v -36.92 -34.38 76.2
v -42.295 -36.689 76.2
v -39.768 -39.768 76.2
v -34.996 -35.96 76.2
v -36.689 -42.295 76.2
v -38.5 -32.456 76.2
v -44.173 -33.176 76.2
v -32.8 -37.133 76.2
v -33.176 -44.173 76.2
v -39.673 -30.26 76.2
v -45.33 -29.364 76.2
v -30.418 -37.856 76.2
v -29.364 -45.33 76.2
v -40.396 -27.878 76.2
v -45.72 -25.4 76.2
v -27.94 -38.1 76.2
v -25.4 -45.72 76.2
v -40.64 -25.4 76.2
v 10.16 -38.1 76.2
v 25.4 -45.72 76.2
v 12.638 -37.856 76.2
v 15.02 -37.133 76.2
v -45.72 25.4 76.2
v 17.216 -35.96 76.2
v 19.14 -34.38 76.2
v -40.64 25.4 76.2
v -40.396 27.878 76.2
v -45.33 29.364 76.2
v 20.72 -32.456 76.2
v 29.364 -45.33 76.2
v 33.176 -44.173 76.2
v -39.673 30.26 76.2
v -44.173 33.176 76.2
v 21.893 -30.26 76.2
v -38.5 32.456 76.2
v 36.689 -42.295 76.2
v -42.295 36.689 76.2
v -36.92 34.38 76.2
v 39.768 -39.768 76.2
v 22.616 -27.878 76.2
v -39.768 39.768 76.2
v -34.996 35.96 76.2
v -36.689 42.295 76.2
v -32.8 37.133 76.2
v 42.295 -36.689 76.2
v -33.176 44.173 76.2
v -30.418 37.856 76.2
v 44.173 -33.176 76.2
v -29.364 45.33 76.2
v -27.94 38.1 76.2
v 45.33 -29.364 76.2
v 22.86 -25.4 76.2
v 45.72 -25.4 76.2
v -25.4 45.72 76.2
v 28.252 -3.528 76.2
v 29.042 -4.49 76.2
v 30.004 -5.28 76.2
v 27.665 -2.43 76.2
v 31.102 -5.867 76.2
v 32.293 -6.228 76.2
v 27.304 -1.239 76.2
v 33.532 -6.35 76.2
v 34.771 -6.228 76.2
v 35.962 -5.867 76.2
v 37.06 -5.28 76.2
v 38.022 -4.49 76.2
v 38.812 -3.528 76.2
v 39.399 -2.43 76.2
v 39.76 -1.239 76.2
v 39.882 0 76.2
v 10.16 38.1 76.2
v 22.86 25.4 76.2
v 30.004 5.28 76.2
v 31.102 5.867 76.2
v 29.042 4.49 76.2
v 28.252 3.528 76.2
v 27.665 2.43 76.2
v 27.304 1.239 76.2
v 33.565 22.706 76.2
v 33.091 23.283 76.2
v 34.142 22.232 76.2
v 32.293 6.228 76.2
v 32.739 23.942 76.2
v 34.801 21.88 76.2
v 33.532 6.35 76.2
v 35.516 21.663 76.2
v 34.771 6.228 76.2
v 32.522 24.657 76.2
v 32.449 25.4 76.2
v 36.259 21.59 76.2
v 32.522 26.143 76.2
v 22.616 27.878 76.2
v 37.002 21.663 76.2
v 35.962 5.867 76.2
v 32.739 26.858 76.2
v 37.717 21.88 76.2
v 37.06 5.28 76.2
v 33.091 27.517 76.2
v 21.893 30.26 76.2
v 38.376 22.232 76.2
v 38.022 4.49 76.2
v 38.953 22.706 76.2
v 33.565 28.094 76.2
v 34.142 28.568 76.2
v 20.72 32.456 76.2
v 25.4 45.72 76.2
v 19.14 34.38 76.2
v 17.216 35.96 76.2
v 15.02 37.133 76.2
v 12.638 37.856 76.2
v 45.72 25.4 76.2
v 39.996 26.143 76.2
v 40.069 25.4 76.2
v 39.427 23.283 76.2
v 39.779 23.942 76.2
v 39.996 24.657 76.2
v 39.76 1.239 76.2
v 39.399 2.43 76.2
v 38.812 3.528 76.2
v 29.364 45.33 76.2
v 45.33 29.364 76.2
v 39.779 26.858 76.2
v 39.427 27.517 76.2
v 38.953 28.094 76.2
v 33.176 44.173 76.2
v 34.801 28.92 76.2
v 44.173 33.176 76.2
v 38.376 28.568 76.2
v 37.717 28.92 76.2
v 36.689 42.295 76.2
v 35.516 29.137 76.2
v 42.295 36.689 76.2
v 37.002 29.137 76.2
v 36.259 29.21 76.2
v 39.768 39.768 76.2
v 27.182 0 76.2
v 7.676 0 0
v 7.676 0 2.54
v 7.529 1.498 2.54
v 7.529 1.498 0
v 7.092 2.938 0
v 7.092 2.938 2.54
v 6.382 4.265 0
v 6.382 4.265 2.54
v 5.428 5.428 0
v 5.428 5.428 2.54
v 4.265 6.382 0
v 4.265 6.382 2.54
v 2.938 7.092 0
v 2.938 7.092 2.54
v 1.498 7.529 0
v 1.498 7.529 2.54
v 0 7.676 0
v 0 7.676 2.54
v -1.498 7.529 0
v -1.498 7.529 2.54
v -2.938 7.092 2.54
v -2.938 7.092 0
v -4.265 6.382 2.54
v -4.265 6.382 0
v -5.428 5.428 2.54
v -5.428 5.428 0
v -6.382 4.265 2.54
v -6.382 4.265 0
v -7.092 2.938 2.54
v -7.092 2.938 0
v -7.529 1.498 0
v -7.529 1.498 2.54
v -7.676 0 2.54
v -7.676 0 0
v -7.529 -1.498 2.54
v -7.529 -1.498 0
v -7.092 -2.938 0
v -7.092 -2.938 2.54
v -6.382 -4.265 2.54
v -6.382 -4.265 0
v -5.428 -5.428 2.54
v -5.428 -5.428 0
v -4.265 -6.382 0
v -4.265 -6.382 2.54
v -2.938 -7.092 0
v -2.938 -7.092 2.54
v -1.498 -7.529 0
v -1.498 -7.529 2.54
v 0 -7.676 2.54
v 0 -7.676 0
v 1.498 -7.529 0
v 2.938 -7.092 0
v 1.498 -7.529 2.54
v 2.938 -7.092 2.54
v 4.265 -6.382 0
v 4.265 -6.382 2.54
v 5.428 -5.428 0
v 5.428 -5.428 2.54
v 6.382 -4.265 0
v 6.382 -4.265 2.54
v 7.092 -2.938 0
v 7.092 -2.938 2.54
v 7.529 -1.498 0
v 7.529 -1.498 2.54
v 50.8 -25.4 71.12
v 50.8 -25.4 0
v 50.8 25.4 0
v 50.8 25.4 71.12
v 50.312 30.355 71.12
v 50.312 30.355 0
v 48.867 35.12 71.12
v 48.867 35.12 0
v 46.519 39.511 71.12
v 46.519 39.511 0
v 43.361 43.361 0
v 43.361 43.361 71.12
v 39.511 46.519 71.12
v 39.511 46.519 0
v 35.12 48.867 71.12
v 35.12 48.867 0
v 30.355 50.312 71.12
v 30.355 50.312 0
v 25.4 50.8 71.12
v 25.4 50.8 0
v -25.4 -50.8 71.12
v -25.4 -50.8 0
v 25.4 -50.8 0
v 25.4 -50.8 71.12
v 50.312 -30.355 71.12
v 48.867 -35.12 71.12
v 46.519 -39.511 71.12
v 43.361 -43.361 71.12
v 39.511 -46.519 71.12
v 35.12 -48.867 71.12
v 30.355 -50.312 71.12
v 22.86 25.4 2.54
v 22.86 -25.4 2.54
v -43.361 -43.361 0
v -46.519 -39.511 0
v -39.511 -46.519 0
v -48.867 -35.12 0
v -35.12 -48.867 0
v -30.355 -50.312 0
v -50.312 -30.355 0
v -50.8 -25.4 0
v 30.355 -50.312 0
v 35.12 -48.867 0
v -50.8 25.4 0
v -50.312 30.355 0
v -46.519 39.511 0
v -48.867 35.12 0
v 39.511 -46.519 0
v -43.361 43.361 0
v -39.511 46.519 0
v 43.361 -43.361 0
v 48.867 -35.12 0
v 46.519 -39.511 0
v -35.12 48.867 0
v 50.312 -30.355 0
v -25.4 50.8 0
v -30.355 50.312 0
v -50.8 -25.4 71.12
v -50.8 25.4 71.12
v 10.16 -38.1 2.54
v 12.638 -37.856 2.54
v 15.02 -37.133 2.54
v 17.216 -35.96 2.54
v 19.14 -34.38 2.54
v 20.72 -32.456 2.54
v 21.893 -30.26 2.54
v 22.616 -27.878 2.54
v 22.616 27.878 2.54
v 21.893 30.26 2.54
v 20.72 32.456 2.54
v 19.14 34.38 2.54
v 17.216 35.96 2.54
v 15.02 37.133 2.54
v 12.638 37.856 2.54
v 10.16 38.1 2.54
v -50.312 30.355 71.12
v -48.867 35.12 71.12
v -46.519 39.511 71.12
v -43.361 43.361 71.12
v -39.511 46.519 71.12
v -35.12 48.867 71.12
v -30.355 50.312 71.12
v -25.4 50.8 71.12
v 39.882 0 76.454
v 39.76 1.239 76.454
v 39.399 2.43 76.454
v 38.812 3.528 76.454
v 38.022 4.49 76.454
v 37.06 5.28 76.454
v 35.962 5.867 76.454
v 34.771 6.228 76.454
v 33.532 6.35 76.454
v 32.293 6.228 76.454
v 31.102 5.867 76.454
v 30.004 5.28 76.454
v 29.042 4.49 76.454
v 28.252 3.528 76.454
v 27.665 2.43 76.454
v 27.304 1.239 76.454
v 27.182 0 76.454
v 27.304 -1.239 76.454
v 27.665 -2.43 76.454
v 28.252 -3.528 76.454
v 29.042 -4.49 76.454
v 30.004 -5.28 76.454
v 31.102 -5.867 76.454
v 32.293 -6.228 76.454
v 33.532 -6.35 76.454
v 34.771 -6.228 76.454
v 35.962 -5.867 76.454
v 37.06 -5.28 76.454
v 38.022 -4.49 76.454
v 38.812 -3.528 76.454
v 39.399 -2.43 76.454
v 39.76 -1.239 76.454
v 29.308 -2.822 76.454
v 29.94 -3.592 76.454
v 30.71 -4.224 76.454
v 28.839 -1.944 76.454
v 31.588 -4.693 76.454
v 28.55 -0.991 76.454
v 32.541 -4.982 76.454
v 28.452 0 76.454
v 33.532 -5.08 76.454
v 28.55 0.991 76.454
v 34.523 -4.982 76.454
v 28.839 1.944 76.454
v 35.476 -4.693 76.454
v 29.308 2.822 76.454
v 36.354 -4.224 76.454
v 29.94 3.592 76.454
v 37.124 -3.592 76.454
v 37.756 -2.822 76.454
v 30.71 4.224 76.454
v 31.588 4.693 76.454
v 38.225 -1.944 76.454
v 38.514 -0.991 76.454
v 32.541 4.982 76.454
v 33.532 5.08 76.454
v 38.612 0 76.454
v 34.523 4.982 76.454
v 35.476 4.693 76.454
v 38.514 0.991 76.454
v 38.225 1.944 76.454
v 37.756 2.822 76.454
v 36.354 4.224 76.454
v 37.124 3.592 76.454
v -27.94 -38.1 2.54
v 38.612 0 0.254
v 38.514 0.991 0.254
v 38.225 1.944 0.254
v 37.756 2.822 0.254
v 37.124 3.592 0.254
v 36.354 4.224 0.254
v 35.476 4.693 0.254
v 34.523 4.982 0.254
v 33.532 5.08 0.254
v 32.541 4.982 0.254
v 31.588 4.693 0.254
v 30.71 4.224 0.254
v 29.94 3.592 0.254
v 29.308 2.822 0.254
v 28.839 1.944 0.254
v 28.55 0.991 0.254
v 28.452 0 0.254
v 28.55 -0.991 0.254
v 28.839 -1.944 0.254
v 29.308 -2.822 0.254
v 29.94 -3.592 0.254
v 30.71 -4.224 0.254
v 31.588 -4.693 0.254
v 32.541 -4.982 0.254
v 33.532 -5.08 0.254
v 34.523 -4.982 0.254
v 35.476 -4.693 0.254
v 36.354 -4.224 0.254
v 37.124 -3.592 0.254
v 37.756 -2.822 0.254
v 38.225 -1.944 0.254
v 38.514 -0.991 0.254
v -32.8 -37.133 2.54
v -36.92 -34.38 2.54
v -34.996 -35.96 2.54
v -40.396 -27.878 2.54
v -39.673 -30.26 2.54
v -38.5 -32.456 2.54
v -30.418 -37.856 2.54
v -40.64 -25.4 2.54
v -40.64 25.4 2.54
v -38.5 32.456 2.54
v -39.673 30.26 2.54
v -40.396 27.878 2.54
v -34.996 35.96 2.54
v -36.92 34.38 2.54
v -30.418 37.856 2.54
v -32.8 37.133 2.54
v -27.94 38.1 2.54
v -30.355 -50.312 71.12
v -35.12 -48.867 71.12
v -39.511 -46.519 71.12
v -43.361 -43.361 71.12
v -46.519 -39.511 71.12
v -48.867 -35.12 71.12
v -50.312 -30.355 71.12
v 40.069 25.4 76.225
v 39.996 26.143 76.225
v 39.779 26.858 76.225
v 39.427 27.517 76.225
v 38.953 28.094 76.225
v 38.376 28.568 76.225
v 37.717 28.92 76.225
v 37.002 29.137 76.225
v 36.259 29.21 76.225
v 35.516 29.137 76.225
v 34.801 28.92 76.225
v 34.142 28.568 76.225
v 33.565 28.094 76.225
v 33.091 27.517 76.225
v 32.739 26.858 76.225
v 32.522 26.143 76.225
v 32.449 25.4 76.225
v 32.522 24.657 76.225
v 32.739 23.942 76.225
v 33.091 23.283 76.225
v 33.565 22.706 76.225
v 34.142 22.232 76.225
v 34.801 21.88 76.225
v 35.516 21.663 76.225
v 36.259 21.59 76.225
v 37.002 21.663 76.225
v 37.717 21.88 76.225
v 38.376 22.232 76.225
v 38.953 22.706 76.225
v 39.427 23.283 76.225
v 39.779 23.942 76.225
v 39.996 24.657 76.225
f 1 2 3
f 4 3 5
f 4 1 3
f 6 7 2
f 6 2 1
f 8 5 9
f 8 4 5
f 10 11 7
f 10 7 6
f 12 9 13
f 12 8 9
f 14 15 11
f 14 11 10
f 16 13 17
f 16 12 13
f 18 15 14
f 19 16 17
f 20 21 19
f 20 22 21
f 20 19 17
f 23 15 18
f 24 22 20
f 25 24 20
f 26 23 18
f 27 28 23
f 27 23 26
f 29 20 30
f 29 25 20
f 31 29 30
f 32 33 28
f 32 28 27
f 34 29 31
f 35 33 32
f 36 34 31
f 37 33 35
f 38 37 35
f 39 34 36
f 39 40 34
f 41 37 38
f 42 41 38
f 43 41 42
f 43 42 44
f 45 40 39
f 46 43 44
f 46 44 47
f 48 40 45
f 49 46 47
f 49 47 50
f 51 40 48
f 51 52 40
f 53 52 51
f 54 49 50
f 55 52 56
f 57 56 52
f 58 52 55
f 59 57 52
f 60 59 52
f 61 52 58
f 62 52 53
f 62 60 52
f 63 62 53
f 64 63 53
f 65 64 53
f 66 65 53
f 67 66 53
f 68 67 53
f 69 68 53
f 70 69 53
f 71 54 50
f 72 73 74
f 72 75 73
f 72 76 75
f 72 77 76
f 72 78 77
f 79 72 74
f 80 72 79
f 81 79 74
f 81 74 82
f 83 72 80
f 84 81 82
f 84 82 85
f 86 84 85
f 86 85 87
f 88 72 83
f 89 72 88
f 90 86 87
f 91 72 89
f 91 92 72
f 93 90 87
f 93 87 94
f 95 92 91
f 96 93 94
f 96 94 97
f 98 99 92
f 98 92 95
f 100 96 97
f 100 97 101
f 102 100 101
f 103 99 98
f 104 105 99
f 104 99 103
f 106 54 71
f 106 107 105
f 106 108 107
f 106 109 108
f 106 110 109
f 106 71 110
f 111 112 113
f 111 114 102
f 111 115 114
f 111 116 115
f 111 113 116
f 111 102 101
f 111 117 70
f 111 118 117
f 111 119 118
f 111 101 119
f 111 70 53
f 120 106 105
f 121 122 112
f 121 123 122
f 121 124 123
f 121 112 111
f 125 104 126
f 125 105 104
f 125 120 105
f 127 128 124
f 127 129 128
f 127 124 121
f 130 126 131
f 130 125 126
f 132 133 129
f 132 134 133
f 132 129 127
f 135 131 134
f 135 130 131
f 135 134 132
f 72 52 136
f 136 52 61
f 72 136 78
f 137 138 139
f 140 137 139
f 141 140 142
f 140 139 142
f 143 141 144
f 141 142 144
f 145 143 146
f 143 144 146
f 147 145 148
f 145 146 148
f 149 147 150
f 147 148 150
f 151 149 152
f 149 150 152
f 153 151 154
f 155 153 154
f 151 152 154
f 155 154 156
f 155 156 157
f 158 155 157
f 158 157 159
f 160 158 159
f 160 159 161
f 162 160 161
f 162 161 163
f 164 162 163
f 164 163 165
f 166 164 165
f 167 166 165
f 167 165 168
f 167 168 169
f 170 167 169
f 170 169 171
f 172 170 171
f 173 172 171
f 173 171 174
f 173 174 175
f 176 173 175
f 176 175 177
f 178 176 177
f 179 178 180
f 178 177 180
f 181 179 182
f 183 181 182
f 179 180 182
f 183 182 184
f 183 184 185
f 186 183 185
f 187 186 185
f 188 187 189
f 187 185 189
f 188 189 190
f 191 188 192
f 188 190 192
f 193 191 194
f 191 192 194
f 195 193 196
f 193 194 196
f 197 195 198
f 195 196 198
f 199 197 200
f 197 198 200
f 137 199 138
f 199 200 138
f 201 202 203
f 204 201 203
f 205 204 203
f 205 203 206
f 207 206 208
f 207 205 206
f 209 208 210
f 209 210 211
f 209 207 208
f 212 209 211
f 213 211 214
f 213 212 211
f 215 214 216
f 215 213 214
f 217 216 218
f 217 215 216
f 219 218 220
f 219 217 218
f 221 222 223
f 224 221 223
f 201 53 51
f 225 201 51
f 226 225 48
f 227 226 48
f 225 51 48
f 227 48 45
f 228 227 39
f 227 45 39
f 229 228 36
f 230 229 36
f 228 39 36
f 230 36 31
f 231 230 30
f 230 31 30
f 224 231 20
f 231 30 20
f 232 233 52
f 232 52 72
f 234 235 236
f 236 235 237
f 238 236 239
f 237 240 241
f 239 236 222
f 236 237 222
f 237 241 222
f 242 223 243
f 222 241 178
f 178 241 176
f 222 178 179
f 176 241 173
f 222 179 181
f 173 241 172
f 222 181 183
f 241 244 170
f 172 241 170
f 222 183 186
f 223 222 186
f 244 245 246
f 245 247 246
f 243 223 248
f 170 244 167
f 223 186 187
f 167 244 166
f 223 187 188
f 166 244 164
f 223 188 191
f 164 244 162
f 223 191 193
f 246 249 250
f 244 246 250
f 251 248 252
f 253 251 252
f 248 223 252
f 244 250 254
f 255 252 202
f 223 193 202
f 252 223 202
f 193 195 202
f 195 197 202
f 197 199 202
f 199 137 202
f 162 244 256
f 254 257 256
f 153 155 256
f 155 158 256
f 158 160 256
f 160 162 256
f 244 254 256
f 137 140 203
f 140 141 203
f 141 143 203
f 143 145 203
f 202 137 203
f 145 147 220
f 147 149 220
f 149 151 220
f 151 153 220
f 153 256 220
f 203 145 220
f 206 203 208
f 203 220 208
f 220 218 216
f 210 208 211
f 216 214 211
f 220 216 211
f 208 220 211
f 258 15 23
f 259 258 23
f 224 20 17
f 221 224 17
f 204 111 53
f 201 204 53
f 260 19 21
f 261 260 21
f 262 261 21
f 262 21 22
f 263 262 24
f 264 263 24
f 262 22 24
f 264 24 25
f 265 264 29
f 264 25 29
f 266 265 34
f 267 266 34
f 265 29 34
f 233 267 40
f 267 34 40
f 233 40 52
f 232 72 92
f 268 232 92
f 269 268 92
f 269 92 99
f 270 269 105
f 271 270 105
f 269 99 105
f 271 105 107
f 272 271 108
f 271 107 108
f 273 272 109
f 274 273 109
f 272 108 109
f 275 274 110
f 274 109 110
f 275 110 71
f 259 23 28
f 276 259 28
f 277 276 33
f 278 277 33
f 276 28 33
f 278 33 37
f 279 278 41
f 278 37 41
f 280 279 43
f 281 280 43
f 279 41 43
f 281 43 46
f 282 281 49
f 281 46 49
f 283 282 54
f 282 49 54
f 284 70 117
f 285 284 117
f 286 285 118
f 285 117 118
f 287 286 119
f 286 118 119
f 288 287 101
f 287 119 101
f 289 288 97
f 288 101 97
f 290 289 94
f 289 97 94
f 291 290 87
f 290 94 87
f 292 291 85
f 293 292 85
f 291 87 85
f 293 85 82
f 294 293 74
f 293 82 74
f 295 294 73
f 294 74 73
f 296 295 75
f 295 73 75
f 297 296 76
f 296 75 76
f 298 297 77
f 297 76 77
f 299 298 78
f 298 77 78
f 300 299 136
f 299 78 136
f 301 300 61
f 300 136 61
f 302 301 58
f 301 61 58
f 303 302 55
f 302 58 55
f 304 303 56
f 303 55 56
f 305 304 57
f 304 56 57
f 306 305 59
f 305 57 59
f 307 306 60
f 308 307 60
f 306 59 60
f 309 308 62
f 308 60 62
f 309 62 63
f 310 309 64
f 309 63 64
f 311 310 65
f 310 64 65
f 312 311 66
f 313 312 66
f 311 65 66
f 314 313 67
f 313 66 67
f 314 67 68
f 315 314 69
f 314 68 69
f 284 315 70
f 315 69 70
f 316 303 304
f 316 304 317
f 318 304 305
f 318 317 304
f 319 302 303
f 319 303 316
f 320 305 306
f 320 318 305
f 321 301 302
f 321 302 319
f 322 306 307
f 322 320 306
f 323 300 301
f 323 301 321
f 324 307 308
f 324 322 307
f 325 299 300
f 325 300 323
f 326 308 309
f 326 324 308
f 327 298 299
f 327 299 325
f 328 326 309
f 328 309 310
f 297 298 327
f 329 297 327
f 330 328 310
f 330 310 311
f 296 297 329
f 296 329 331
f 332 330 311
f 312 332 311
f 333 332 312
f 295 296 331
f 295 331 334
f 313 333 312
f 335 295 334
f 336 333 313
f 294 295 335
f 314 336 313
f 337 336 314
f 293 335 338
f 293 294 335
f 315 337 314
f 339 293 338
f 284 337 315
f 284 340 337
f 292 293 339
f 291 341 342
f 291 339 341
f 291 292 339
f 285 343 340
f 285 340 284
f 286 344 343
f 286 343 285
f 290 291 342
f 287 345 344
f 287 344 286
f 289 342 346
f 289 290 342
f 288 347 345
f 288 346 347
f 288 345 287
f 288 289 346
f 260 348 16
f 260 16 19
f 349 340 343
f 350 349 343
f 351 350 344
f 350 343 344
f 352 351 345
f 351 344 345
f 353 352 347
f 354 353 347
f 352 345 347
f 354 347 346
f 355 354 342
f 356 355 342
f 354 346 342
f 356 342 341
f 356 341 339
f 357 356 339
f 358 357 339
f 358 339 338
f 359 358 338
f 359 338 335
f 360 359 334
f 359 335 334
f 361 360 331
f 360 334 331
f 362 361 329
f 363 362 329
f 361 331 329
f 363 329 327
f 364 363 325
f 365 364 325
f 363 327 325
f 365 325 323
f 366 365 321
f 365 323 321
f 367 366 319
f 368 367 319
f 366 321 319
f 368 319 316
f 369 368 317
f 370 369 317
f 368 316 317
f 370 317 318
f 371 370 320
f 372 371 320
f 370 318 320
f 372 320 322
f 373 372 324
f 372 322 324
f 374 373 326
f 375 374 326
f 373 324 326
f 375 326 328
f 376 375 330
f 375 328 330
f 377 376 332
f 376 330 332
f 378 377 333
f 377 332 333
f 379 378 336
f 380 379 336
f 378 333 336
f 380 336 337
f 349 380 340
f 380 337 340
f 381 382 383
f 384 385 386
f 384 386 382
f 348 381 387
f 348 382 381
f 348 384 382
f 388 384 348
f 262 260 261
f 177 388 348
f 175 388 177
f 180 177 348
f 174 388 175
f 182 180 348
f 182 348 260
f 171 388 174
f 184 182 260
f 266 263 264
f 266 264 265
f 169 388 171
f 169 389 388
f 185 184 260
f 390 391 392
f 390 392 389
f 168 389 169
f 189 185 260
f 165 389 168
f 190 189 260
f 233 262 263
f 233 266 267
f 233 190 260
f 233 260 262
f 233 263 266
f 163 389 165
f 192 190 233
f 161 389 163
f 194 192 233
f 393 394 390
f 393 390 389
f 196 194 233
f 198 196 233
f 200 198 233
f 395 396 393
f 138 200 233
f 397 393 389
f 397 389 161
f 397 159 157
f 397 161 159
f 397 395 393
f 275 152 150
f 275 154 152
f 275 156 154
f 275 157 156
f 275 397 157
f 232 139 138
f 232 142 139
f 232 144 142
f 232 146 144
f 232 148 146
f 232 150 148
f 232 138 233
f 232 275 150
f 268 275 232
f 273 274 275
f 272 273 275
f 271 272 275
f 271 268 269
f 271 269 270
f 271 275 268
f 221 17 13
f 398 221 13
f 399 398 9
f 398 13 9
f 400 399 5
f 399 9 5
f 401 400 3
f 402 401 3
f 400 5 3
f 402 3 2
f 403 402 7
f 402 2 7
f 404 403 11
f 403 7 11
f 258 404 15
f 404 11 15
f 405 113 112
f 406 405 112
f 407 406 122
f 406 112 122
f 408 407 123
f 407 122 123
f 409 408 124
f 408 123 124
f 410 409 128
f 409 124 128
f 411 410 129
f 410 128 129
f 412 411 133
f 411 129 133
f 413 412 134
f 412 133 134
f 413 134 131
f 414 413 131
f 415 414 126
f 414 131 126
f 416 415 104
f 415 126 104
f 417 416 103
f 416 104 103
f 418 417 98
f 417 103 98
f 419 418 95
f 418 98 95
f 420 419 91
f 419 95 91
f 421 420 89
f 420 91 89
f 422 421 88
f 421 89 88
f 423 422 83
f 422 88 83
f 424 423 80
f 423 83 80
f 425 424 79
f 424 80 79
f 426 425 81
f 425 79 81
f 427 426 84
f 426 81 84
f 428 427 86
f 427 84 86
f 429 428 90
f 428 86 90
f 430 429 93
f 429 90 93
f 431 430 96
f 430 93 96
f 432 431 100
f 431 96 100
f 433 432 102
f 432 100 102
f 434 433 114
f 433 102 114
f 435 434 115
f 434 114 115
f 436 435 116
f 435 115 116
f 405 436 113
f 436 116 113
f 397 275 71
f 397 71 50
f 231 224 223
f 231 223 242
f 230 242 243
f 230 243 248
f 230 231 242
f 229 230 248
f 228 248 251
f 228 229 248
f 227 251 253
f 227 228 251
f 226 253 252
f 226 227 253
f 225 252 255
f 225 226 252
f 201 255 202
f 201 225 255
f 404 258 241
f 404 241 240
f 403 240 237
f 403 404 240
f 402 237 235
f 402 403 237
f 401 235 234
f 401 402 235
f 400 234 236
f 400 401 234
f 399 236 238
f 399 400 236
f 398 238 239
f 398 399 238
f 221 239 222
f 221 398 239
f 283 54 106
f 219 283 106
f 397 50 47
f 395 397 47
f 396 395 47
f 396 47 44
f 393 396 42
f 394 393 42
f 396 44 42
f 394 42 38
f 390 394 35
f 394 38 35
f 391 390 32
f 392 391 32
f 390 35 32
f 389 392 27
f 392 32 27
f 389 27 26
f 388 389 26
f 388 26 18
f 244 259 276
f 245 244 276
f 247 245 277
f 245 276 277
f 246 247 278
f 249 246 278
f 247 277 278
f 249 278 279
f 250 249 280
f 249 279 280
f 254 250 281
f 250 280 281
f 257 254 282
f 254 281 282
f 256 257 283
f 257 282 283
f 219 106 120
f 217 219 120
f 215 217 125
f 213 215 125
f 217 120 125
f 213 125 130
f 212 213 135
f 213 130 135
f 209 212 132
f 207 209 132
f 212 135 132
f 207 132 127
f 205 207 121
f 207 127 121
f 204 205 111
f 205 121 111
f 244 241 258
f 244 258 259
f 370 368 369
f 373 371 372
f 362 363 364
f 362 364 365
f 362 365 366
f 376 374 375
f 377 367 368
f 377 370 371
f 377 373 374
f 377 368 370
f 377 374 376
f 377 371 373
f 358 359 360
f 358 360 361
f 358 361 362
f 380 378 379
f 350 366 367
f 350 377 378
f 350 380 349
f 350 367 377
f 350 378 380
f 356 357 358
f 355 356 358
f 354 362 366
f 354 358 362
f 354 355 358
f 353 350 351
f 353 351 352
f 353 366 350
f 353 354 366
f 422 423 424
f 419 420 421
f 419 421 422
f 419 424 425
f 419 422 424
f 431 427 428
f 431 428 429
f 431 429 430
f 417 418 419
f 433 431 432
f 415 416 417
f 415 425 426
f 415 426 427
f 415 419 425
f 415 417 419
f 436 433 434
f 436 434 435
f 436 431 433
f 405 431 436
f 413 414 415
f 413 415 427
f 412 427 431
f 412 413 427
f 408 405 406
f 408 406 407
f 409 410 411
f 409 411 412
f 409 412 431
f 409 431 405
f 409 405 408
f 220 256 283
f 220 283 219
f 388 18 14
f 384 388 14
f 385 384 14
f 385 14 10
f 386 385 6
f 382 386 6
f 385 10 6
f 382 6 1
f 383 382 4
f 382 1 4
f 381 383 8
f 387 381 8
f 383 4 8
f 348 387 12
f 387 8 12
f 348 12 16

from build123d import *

# Parameters (mm, degrees)
F0_W      = 101.6
F0_H      = 101.6
F1_DEPTH  = 76.2
F3_R      = 25.4
F4_SIZE   = 5.08
F5_DEPTH  = 73.66
F6_R      = 7.676164
F7_DEPTH  = 25.4
F8_R      = 6.35
F9_DEPTH  = 0.254
F10_R     = 5.08
F11_DEPTH = 76.2
F12_R     = 3.81
F13_DEPTH = 0.0254


with BuildPart() as f1:
    # F0 (on Top) → F1 (new body)
    with BuildSketch(Plane.XY):
        Rectangle(F0_W, F0_H)
    extrude(amount=F1_DEPTH)

    # F3
    f3_edges = [f1.edges().sort_by_distance(p)[0] for p in [
        (-50.8, 50.8, 38.1),
        (50.8, 50.8, 38.1),
        (50.8, -50.8, 38.1),
        (-50.8, -50.8, 38.1),
    ]]
    fillet(f3_edges, radius=F3_R)

    # F4
    f4_edges = [f1.edges().sort_by_distance(p)[0] for p in [
        (-50.8, 0, 76.2),
    ]]
    chamfer(f4_edges, length=F4_SIZE)

    # F2 (on face) → F5 (cut)
    with BuildSketch(Plane.XY.offset(76.2)):
        with BuildLine():
            Line((10.16, 38.1), (-27.94, 38.1))
            ThreePointArc((-27.94, 38.1), (-36.920256, 34.380256), (-40.64, 25.4))
            Line((-40.64, 25.4), (-40.64, -25.4))
            ThreePointArc((-40.64, -25.4), (-36.920256, -34.380256), (-27.94, -38.1))
            Line((-27.94, -38.1), (10.16, -38.1))
            ThreePointArc((10.16, -38.1), (19.140256, -34.380256), (22.86, -25.4))
            Line((22.86, -25.4), (22.86, 25.4))
            ThreePointArc((22.86, 25.4), (19.140256, 34.380256), (10.16, 38.1))
        make_face()
    extrude(amount=-F5_DEPTH, mode=Mode.SUBTRACT)

    # F6 (on face) → F7 (cut)
    with BuildSketch(Plane.XY.offset(2.54)):
        Circle(F6_R)
    extrude(amount=-F7_DEPTH, mode=Mode.SUBTRACT)

    # F8 (on face) → F9 (join)
    with BuildSketch(Plane.XY.offset(76.2)):
        with Locations((33.531968, 0)):
            Circle(F8_R)
    extrude(amount=F9_DEPTH)

    # F10 (on face) → F11 (cut)
    with BuildSketch(Plane.XY.offset(76.454)):
        with Locations((33.531968, 0)):
            Circle(F10_R)
    extrude(amount=-F11_DEPTH, mode=Mode.SUBTRACT)

    # F12 (on face) → F13 (join)
    with BuildSketch(Plane.XY.offset(76.2)):
        with Locations((36.258892, 25.4)):
            Circle(F12_R)
    extrude(amount=F13_DEPTH)


solid = f1.part
